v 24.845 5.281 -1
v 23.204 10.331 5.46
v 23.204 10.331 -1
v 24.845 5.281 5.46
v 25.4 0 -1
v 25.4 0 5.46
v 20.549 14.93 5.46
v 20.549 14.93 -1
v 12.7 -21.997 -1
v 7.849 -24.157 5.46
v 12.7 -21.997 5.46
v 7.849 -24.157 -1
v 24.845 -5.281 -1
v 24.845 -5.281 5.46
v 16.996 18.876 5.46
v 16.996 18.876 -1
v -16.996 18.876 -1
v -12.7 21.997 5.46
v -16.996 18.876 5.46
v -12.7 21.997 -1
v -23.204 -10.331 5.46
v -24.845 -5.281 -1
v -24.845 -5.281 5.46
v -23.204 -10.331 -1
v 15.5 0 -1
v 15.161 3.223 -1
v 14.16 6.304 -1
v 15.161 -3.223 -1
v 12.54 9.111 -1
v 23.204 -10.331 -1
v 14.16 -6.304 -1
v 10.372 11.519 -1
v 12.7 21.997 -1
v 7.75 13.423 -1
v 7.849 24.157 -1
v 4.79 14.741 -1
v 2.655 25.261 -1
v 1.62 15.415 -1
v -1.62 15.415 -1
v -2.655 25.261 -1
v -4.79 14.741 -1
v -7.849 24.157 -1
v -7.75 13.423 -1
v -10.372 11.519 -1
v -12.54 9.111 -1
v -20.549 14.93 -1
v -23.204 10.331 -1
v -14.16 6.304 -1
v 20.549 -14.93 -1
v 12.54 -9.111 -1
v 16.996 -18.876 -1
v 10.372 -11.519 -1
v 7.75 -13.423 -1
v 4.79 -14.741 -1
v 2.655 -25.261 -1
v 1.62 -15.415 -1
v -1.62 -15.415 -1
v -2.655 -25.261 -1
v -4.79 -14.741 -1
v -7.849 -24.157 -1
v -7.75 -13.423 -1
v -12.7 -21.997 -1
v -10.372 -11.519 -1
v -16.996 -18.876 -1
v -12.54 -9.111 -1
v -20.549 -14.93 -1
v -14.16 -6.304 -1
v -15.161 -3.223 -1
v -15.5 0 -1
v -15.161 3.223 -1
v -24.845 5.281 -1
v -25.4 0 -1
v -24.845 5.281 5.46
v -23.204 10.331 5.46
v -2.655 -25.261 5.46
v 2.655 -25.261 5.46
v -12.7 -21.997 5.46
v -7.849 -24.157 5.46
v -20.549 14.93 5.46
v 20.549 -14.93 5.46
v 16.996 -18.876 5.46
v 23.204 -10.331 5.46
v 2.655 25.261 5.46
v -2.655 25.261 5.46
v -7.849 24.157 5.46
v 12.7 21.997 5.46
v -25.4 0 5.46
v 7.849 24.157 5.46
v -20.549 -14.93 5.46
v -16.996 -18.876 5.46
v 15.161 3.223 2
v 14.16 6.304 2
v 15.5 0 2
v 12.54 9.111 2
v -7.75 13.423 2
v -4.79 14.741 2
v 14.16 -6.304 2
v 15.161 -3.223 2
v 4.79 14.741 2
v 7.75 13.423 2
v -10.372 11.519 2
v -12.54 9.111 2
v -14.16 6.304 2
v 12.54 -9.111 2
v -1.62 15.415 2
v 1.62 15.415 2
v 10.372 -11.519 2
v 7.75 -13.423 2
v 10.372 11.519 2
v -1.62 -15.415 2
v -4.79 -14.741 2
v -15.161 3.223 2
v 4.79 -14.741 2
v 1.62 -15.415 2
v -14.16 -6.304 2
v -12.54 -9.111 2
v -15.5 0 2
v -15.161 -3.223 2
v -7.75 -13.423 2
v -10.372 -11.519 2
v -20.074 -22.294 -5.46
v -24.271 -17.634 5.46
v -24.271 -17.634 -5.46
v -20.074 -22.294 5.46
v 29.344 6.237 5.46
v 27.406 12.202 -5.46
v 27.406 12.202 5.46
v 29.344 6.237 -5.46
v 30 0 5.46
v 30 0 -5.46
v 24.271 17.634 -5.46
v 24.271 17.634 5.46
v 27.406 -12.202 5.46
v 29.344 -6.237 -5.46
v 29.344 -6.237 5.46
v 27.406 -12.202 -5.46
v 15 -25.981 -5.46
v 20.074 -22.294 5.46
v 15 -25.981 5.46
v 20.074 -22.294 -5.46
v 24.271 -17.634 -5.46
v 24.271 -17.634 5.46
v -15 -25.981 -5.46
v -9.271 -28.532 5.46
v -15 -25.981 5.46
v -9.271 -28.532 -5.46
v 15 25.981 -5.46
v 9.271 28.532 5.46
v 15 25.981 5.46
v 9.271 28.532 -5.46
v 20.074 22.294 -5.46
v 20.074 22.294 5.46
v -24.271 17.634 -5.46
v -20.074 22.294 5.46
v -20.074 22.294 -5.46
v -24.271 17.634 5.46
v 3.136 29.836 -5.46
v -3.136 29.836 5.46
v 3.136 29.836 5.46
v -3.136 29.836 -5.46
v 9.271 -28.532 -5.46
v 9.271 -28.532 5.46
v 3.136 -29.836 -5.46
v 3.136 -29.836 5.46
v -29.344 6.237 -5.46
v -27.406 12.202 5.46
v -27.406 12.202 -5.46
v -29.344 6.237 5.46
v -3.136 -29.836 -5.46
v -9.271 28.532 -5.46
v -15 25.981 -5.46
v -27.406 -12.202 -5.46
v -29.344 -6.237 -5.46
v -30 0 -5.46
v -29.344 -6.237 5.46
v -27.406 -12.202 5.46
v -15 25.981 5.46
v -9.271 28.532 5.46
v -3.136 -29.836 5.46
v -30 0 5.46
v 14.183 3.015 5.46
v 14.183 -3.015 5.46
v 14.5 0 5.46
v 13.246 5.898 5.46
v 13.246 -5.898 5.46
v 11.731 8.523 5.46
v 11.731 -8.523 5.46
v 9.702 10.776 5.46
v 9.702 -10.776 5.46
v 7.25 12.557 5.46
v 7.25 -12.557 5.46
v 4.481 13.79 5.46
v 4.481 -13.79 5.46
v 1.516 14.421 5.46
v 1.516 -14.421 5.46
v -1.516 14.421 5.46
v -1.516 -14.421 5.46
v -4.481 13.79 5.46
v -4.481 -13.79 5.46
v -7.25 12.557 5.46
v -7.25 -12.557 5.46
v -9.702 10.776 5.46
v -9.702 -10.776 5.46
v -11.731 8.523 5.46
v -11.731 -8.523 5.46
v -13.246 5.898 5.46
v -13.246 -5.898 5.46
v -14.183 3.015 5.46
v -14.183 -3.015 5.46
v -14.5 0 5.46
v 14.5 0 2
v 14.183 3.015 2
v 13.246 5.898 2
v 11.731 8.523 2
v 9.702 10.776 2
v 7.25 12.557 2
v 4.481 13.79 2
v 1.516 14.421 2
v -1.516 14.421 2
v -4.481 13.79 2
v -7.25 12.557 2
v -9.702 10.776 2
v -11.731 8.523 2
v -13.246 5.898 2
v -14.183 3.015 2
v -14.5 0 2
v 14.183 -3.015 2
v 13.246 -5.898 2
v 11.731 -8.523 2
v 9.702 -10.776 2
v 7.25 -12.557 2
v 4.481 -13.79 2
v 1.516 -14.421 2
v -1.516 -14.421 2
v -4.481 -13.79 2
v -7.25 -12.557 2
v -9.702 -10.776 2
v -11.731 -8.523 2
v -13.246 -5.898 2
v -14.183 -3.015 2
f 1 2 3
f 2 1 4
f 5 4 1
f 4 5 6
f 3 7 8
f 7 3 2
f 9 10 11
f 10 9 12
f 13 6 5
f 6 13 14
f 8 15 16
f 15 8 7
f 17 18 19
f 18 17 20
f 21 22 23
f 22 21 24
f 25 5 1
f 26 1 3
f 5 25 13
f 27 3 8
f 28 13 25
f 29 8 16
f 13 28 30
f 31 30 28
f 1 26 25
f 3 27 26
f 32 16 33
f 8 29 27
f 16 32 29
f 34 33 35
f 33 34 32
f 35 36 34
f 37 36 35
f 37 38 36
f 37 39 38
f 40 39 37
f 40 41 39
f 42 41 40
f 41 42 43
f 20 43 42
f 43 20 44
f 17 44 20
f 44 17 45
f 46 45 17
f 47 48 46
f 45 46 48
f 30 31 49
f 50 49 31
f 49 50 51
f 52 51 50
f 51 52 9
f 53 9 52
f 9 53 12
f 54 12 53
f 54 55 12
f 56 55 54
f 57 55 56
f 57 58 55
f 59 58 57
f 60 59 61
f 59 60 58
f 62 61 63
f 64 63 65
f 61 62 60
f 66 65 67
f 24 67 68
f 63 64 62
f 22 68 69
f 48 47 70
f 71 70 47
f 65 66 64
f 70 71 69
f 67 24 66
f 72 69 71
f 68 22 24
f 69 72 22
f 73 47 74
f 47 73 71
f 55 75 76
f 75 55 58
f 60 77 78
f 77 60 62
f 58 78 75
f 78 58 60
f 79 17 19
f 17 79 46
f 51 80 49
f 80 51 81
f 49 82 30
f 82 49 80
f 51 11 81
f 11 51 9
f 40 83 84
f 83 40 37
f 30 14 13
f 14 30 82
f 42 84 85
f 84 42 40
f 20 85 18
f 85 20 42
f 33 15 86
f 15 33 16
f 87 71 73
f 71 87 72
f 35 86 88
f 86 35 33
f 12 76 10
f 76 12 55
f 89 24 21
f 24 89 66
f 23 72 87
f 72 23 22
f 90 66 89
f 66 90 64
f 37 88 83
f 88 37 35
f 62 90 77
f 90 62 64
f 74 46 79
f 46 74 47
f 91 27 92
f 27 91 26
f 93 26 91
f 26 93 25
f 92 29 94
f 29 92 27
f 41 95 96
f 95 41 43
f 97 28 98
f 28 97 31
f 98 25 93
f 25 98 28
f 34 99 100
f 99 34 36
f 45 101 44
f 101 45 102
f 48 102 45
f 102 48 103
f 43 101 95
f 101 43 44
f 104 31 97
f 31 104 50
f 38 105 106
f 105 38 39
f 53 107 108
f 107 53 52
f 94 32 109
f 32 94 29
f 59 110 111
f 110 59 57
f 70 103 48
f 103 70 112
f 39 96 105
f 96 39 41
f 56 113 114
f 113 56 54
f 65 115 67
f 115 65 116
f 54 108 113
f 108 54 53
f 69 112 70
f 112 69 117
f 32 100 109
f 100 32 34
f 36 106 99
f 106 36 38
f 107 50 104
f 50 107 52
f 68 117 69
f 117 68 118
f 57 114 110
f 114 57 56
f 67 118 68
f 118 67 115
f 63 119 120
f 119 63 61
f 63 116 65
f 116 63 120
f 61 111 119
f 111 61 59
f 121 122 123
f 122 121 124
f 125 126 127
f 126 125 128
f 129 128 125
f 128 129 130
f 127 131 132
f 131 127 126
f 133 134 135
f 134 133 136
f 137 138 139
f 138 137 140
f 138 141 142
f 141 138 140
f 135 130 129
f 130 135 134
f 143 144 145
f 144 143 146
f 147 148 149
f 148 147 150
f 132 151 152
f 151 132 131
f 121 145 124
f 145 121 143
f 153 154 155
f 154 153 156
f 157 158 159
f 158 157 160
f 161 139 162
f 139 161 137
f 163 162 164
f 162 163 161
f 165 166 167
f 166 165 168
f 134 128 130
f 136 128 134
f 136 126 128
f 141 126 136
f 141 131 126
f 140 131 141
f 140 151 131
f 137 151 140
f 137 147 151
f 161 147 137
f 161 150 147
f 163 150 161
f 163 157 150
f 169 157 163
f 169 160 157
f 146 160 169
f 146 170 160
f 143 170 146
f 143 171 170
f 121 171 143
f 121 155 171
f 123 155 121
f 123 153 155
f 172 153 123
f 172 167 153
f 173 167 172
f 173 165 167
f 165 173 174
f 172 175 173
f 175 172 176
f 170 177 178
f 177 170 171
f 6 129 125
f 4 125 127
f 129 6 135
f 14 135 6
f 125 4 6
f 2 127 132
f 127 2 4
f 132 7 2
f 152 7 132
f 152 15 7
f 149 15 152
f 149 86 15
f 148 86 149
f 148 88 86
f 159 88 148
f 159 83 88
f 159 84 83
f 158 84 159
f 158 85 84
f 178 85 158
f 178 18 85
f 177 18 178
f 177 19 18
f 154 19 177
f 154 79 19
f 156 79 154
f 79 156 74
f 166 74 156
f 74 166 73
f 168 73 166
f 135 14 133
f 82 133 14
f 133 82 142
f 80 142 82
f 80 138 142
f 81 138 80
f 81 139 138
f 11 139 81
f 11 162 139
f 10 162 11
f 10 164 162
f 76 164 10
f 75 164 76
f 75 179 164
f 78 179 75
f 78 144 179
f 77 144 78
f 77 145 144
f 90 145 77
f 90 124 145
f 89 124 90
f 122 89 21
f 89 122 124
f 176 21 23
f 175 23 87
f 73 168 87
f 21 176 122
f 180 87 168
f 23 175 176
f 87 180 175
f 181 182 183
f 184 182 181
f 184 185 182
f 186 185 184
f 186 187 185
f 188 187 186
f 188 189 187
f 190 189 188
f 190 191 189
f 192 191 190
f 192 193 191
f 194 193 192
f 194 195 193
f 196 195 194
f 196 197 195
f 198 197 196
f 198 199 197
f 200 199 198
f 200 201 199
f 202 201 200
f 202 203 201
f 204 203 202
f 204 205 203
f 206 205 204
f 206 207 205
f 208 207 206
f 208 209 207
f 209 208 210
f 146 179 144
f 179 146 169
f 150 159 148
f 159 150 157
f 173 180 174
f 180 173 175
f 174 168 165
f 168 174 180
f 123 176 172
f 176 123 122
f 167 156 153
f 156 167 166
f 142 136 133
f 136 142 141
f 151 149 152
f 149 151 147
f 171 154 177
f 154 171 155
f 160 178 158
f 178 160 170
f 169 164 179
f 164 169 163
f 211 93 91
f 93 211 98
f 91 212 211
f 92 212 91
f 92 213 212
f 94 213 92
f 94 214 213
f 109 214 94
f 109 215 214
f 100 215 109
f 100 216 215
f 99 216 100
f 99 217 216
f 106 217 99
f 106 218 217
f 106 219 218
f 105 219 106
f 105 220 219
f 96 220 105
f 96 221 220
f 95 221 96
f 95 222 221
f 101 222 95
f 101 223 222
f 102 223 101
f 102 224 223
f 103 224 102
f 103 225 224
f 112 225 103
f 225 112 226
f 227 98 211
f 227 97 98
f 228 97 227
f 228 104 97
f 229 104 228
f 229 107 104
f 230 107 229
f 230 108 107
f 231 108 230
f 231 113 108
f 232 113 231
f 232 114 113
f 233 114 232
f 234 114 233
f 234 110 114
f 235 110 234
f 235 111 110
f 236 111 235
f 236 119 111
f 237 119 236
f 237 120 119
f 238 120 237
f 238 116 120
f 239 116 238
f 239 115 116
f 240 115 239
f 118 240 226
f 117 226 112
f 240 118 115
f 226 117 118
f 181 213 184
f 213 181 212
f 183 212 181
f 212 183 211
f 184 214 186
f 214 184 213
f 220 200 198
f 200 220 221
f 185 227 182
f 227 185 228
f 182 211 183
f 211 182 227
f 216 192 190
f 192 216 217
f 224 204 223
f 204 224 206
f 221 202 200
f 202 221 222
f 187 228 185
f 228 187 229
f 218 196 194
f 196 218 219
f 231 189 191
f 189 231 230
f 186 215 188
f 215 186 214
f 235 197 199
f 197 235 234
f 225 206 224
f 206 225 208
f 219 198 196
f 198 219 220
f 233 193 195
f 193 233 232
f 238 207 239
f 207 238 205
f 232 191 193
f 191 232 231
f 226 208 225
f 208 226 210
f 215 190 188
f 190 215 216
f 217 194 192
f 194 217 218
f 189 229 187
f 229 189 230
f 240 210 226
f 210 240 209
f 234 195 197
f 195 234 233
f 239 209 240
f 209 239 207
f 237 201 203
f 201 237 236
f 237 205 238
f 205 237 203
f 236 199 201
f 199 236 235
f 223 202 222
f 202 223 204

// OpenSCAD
 
difference()
  {
  difference()
    {
        cylinder(h=10.92, r1=30, r2=30,center=true);
        translate([0,0,14]) {
        difference()
            {
            cylinder(30,r1=25.4,r2=25.4,center=true);
            cylinder(60,r1=15.5,r2=15.5,center=true);   
            }
        }
}
   translate([0,0,23]) {
  difference()
 {
    cylinder(42,r1=25.4,r2=25.4,center=true);
    cylinder(60,r1=14.5,r2=14.5,center=true);   
 }
}
}




 
 
 
